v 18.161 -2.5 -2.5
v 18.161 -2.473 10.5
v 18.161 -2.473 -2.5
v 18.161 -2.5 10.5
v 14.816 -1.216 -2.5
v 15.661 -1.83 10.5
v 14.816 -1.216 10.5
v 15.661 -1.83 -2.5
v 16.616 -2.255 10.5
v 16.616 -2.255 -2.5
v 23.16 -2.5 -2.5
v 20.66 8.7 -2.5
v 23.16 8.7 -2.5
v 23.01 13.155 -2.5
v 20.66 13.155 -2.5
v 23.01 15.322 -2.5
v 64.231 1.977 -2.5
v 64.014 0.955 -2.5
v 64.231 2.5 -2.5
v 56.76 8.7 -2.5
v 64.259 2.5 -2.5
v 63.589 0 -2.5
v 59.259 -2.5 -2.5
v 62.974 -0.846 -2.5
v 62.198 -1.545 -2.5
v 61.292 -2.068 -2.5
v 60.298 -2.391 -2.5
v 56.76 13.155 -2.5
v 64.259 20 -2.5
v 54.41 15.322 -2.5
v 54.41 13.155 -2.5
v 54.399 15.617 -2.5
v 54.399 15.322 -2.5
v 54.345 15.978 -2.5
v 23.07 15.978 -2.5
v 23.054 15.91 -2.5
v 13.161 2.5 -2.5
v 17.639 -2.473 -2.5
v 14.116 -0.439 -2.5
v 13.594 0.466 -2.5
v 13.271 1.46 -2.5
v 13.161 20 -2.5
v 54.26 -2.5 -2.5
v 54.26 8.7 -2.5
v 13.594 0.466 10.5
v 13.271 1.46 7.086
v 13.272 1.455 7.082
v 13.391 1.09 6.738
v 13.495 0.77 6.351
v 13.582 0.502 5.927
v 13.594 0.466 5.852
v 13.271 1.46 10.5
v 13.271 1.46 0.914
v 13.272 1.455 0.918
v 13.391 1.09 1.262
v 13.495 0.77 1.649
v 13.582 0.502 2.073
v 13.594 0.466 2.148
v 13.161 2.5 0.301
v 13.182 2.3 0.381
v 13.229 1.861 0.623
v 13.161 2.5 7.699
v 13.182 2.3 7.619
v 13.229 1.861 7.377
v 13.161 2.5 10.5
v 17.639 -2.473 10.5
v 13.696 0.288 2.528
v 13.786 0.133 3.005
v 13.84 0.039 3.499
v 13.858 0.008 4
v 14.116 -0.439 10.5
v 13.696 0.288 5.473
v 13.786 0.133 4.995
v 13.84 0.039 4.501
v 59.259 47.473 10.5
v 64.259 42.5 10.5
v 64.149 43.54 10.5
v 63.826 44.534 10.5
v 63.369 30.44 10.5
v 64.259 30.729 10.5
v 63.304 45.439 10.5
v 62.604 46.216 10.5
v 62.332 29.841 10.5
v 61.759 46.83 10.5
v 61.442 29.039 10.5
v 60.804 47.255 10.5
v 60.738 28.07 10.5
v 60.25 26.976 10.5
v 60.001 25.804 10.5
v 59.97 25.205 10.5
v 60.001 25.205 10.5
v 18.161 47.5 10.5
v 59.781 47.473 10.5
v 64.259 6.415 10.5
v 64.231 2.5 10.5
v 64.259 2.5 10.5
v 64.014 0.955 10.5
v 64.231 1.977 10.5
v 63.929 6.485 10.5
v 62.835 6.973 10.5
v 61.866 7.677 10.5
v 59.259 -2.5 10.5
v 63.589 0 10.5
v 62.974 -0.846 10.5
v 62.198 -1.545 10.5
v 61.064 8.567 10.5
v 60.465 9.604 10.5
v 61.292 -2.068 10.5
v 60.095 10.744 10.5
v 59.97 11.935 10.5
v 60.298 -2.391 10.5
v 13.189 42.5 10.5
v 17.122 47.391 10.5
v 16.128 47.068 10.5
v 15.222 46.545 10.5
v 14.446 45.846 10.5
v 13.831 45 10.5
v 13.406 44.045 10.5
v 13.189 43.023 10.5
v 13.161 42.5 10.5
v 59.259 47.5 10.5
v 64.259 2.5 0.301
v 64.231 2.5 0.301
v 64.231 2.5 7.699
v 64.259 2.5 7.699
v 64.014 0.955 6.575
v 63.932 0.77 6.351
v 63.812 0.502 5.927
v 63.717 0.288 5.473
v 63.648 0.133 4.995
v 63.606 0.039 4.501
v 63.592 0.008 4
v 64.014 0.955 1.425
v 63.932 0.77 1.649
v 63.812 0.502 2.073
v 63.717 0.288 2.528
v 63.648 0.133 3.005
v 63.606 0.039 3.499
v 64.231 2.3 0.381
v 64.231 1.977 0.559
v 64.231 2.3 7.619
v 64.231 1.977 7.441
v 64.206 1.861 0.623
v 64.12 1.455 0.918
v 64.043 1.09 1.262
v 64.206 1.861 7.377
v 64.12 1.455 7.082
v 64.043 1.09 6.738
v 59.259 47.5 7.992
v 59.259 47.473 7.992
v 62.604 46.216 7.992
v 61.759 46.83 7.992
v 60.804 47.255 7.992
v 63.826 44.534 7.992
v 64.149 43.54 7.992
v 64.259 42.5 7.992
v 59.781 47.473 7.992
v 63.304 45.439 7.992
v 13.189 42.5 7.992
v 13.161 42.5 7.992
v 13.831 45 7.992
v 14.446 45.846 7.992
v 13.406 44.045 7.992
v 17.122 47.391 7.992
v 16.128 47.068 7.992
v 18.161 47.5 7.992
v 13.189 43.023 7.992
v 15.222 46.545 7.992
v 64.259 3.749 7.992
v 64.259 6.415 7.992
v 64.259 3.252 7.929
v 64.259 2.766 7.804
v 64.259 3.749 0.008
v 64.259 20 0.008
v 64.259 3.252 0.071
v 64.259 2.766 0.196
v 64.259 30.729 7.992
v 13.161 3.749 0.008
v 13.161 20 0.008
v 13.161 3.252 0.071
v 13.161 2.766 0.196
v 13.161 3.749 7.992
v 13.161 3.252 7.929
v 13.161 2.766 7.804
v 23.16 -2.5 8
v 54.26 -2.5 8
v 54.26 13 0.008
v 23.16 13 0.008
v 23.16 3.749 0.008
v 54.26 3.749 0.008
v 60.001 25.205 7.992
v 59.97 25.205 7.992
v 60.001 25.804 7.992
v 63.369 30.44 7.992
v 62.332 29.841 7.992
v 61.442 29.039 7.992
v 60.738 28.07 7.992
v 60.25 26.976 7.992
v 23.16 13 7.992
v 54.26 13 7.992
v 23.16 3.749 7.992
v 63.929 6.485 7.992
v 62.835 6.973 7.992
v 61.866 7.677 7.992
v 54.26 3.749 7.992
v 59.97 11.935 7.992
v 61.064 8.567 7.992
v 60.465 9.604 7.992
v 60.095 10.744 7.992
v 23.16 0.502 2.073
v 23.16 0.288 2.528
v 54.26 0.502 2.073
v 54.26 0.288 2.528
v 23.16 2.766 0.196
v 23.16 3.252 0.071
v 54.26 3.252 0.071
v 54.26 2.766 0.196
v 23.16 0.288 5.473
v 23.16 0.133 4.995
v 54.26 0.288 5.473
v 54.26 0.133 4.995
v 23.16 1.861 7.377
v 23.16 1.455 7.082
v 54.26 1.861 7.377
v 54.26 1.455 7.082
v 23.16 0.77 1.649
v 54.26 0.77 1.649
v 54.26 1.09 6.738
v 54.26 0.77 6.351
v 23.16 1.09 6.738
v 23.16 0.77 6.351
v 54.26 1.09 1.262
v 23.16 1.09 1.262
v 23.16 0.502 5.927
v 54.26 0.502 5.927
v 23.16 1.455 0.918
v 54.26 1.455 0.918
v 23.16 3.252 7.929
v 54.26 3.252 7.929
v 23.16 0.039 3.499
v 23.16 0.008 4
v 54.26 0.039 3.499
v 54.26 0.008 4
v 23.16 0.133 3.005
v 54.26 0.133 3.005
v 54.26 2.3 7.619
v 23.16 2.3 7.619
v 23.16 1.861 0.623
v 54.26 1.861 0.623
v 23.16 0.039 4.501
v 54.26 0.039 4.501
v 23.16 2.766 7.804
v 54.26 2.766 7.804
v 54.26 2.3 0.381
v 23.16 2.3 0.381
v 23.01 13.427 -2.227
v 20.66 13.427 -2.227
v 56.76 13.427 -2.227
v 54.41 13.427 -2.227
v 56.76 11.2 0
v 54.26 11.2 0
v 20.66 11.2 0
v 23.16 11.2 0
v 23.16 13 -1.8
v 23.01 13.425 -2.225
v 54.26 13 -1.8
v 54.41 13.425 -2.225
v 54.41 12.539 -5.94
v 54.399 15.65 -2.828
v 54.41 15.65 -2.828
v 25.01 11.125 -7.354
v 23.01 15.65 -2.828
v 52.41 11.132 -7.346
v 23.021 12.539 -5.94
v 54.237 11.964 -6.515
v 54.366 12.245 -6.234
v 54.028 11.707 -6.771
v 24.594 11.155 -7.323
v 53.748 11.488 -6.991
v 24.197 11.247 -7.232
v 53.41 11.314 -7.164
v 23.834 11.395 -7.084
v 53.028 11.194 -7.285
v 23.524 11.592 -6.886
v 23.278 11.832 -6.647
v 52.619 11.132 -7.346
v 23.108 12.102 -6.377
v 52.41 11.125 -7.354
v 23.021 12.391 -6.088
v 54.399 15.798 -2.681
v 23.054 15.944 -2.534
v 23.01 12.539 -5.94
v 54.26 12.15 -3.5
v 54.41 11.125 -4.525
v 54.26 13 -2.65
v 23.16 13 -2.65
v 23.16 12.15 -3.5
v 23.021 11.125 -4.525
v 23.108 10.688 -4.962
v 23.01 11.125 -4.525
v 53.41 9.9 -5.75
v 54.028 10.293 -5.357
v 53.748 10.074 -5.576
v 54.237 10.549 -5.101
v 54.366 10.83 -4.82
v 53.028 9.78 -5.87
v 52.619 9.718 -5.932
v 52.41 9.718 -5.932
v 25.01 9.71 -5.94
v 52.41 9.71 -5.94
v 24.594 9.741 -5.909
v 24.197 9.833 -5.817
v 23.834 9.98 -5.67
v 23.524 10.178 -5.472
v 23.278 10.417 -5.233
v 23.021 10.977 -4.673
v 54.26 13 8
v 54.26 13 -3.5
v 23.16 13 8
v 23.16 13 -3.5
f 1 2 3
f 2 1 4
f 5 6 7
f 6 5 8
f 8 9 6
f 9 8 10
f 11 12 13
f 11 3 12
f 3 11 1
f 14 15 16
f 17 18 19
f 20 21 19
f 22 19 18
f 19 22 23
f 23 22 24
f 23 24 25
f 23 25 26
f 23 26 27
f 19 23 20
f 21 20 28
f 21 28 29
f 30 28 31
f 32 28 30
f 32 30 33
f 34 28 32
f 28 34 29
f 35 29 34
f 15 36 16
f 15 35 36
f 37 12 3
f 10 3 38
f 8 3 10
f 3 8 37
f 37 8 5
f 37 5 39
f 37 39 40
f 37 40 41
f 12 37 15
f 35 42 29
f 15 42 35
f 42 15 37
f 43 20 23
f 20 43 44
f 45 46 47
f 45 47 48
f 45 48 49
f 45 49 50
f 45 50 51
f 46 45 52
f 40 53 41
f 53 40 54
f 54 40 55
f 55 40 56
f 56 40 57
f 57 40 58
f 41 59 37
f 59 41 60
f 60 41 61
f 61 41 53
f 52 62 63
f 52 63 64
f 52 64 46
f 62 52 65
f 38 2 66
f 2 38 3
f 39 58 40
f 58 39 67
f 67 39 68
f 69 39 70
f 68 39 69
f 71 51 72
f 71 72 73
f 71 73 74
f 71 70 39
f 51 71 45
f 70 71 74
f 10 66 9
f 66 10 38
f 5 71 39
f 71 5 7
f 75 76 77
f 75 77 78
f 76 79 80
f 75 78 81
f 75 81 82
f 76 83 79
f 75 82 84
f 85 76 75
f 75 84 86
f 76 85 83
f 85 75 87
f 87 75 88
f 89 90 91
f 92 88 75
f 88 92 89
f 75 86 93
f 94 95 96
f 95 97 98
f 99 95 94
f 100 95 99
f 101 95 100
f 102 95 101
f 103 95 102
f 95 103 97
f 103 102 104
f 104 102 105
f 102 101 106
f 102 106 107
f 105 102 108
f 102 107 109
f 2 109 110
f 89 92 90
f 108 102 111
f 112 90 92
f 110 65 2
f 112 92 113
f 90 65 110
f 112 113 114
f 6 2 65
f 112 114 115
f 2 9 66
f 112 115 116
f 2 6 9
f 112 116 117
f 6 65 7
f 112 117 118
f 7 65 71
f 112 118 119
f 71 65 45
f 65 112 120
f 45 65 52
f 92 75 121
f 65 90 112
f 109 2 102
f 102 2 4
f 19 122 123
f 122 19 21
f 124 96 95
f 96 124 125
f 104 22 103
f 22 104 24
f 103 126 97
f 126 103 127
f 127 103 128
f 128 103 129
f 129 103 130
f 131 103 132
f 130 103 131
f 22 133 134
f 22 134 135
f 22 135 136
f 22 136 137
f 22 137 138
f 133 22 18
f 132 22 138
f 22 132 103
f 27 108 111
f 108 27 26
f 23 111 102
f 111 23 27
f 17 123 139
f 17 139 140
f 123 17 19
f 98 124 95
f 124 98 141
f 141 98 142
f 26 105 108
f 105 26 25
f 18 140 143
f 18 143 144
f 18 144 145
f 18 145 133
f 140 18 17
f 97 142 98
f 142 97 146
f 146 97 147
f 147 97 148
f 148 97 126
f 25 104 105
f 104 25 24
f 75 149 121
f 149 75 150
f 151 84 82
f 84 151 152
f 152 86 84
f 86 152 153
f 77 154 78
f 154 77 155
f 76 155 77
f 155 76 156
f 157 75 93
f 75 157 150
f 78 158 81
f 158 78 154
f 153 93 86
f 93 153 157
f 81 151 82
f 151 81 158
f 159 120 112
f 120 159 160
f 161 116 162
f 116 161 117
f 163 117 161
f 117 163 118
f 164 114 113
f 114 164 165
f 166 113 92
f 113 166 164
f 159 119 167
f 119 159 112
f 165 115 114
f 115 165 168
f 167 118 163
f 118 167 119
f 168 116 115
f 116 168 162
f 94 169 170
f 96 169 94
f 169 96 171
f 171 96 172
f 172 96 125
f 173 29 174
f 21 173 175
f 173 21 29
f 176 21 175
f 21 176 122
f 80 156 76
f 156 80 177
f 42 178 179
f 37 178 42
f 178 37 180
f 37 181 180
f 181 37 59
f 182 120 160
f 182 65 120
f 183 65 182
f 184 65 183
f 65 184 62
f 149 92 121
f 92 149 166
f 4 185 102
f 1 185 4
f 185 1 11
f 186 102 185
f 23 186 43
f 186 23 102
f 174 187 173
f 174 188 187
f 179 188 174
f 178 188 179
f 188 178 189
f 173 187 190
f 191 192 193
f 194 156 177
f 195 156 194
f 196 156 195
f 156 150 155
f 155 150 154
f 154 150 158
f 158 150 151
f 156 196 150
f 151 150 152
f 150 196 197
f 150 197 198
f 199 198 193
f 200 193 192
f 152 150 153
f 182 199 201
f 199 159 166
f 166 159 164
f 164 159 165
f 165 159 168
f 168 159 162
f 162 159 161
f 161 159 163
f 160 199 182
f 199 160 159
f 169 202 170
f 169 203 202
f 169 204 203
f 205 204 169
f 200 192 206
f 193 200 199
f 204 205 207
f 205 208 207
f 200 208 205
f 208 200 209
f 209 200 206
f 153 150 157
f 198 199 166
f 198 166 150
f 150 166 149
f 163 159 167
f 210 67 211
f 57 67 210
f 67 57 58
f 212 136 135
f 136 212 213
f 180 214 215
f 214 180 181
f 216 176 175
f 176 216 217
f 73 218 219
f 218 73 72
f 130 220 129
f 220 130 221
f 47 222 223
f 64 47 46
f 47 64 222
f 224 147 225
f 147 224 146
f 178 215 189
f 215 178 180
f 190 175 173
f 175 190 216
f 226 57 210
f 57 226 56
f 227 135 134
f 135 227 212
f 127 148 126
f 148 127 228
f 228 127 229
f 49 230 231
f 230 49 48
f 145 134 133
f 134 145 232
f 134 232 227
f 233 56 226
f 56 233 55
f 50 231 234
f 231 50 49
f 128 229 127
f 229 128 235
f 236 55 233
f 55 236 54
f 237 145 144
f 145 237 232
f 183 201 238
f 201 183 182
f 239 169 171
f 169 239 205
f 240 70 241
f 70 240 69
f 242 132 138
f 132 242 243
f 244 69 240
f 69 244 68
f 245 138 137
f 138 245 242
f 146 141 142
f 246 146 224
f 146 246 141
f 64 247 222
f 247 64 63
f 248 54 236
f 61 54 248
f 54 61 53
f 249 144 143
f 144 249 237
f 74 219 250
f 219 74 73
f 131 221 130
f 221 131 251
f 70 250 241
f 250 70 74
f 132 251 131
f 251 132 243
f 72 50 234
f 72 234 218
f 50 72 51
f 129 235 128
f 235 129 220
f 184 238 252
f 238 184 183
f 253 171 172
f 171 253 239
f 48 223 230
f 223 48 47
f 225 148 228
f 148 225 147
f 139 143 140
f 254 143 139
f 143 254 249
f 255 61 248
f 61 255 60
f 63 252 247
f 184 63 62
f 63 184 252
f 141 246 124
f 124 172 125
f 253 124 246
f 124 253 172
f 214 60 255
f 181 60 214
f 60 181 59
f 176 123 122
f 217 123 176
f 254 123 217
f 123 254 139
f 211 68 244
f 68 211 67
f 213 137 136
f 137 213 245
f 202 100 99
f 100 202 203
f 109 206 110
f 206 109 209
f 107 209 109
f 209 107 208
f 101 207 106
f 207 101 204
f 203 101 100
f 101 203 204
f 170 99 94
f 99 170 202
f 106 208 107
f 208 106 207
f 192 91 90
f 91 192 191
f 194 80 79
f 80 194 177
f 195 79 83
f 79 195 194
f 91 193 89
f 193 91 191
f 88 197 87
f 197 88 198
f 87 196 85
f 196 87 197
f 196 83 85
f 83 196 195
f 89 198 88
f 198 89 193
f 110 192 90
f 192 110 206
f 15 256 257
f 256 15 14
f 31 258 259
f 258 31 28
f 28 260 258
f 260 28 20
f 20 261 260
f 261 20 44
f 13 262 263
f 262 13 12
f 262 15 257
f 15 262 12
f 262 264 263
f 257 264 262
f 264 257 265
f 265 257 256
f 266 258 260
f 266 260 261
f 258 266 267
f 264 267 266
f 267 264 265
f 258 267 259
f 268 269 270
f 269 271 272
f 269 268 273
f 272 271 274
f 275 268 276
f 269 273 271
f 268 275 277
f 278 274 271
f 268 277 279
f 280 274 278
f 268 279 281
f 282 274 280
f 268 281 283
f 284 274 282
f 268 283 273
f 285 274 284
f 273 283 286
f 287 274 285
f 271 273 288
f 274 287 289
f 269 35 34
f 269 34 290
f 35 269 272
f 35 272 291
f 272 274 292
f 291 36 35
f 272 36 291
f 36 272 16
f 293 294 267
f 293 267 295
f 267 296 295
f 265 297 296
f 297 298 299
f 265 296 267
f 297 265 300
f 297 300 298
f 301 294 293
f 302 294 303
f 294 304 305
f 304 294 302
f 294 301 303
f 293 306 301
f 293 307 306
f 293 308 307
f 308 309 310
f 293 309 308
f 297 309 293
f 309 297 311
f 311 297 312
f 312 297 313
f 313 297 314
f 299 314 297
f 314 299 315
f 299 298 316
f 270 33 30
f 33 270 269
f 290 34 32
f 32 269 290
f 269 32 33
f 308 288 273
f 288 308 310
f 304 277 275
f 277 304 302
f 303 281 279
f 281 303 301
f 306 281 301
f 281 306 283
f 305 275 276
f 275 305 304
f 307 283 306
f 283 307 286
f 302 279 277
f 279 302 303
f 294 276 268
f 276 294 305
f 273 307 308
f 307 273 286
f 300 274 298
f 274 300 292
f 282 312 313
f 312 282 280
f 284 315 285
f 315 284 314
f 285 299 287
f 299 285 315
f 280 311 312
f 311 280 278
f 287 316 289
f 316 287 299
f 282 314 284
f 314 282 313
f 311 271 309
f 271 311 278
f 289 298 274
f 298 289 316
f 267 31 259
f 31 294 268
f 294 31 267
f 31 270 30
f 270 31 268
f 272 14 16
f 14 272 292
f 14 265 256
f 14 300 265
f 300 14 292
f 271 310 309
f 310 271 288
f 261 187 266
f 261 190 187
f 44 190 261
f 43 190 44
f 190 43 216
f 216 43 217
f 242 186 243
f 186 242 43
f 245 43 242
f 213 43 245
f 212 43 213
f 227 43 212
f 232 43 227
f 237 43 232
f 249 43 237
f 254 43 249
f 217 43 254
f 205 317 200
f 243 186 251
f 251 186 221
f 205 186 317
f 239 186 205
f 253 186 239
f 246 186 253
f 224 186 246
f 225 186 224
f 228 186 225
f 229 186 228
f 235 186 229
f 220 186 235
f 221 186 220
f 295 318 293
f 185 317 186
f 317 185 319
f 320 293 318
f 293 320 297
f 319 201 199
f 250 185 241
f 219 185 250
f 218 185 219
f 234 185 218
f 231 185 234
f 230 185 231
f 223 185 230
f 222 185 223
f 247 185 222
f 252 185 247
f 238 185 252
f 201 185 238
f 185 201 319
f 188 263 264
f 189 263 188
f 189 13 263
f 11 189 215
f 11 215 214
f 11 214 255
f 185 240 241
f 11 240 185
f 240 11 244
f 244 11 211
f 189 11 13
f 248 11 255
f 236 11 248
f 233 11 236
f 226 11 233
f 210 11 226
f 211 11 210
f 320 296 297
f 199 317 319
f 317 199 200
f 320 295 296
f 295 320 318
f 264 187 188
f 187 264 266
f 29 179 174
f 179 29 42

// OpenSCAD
// Set to 0.01 for higher definition curves (renders slower)
$fs = 0.1;

module roundedsquare(xx, yy, radius) {

difference(){

    square([xx,yy]);

    difference(){
        translate([-.5,-.5,-.2])
        square([radius+.5,radius+.5]);

        translate([radius,radius,height/2])
        cylinder(height,radius,radius,true);
    }
    translate([xx,0,0])
    rotate(90)
    difference(){
        translate([-.5,-.5,-.2])
        square([radius+.5,radius+.5]);

        translate([radius,radius,height/2])
        cylinder(height,radius,radius,true);
    }

    translate([xx,yy,0])
    rotate(180)
    difference(){
        translate([-.5,-.5,-.2])
        square([radius+.5,radius+.5]);

        translate([radius,radius,height/2])
        cylinder(height,radius,radius,true);
    }

    translate([0,yy,0])
    rotate(270)
    difference(){
        translate([-.5,-.5,-.2])
        square([radius+.5,radius+.5]);

        translate([radius,radius,height/2])
        cylinder(height,radius,radius,true);
    }
}
}

module roundedcube2(xx, yy, height, radius) {

difference(){

    cube([xx,yy,height]);

    difference(){
        translate([-.5,-.5,-.2])
        cube([radius+.5,radius+.5,height+.5]);

        translate([radius,radius,height/2])
        cylinder(height,radius,radius,true);
    }
    translate([xx,0,0])
    rotate(90)
    difference(){
        translate([-.5,-.5,-.2])
        cube([radius+.5,radius+.5,height+.5]);

        translate([radius,radius,height/2])
        cylinder(height,radius,radius,true);
    }

    translate([xx,yy,0])
    rotate(180)
    difference(){
        translate([-.5,-.5,-.2])
        cube([radius+.5,radius+.5,height+.5]);

        translate([radius,radius,height/2])
        cylinder(height,radius,radius,true);
    }

    translate([0,yy,0])
    rotate(270)
    difference(){
        translate([-.5,-.5,-.2])
        cube([radius+.5,radius+.5,height+.5]);

        translate([radius,radius,height/2])
        cylinder(height,radius,radius,true);
    }
}
}


module phone(phone_width, phone_length, phone_thickness, phone_edge_radius, camera_bump_x_offset, camera_bump_y_offset, camera_bump_width, camera_bump_length, camera_bump_thickness, camera_bump_radius) {
    sphere_size = (phone_thickness/2);
    
    //minowski adds spheres around parts, so we need to translate by sphere_size
    translate([sphere_size, sphere_size, sphere_size]) {
        minkowski() {
           //minowski adds spheres around parts, so we need remove sphere size from width, length, and thickness
           roundedcube2(phone_width-sphere_size*2, phone_length-sphere_size*2, 0.00001, phone_edge_radius);
           sphere(r=sphere_size,$fn=50);
         }
     }

    //translate([phone_width-camera_bump_x_offset-camera_bump_width/2, camera_bump_y_offset-camera_bump_y_offset/2, phone_thickness-0.1]) {
    translate([phone_width-camera_bump_width/2-camera_bump_x_offset, camera_bump_y_offset-camera_bump_length/2, phone_thickness-0.1]) {
        roundedcube2(camera_bump_width, camera_bump_length, camera_bump_thickness+0.1, camera_bump_radius);
    }
}

module mirror(size = [1,1,1], angle = 225) {
    rotate(a=angle, v=[1,0,0]){
        cube(size);
    }
}

module mirror_round(l,w,h, angle = 225, radius = 5) {
    rotate(a=angle, v=[1,0,0]){
        roundedcube2(l,w,h,radius);
    }
}


// all units in mm and degress

//offsets
phone_thickness_offset = 0.3;
camera_bump_offset = 0.1;

// iPhone Xs dimensions
phone_width = 77.42; //from spec
phone_length = 157.53; //from spec
phone_thickness = 7.7+phone_thickness_offset; //from spec
phone_edge_radius = 8; // guess
camera_bump_x_offset = 11.82-camera_bump_offset; //from spec with offset
camera_bump_y_offset = 18.67-camera_bump_offset; //from spec with offset
camera_bump_width = 11.26+camera_bump_offset*2; //from spec with offset
camera_bump_length = 24.53+camera_bump_offset*2; //from spec with offset
camera_bump_thickness = 1.56+1;  //spec 1.56
camera_bump_radius = camera_bump_width/2; //Xr specific, make it round
notch_height = 3.91+4.99;

// DFM experimental offsets
dfm_mirror_width= 0.7;
dfm_mirror_thickness=0.15;
dfm_notch_offset=2.3;

// mirror
mirror_height = 25.4; //from spec
mirror_width = 35.4 + dfm_mirror_width; //from spec -- 36.1 in file?
mirror_thickness = 3 + dfm_mirror_thickness; //from spec --

// mirror back
mirror_back_height = 8.4;
mirror_back_width = 35.4-4;
mirror_back_thickness = 2;

// clip
clip_width = phone_width*0.66;
clip_length = 50;
clip_top_bottom_thickness = 2.5;
clip_thickness = phone_thickness+(clip_top_bottom_thickness*2);

// clip cutout
cutout_width = mirror_width-5;
cutout_length = 16;
cutout_thickness = clip_thickness/2+5; //2 is just for some clearance

notch_offset_height = notch_height+dfm_notch_offset; //notch height from spec, add more?
notch_offset_width = phone_width/2-mirror_width/2;
back_offset_width = phone_width/2-mirror_back_width/2;

//trim up top length
difference() {
  //cutout from slot
    difference() {
      //clip with back
      union() {
        //resulting clip
        difference() {
          //clip cube
          translate([phone_width/2-clip_width/2, -clip_top_bottom_thickness, -clip_top_bottom_thickness]) color("red") roundedcube2(clip_width, clip_length, clip_thickness, 5);
          //phone and mirror back
          union() {
            //phone
            phone(phone_width, phone_length, phone_thickness, phone_edge_radius, camera_bump_x_offset, camera_bump_y_offset, camera_bump_width, camera_bump_length, camera_bump_thickness, camera_bump_radius);

            //mirror slot
            translate([notch_offset_width,notch_offset_height,0]) {
              mirror([mirror_width, mirror_height, mirror_thickness]);
            }
          }
        }

        //mirror back 4.1 is a magic number :/
        translate([back_offset_width, notch_offset_height+4.45, 0]) {
          color("blue") mirror_round(mirror_back_width, mirror_back_height, mirror_back_thickness, 225, 2);
        }
    }
    // cutout - with some magic numbers
    translate([phone_width/2-cutout_width/2,-3,-clip_top_bottom_thickness-1]) color("green") cube([cutout_width,cutout_length,cutout_thickness]);
  }
  // front trim cube
  translate([-10,20,-phone_thickness]) cube([phone_width+20,phone_length+20,10]);
}
